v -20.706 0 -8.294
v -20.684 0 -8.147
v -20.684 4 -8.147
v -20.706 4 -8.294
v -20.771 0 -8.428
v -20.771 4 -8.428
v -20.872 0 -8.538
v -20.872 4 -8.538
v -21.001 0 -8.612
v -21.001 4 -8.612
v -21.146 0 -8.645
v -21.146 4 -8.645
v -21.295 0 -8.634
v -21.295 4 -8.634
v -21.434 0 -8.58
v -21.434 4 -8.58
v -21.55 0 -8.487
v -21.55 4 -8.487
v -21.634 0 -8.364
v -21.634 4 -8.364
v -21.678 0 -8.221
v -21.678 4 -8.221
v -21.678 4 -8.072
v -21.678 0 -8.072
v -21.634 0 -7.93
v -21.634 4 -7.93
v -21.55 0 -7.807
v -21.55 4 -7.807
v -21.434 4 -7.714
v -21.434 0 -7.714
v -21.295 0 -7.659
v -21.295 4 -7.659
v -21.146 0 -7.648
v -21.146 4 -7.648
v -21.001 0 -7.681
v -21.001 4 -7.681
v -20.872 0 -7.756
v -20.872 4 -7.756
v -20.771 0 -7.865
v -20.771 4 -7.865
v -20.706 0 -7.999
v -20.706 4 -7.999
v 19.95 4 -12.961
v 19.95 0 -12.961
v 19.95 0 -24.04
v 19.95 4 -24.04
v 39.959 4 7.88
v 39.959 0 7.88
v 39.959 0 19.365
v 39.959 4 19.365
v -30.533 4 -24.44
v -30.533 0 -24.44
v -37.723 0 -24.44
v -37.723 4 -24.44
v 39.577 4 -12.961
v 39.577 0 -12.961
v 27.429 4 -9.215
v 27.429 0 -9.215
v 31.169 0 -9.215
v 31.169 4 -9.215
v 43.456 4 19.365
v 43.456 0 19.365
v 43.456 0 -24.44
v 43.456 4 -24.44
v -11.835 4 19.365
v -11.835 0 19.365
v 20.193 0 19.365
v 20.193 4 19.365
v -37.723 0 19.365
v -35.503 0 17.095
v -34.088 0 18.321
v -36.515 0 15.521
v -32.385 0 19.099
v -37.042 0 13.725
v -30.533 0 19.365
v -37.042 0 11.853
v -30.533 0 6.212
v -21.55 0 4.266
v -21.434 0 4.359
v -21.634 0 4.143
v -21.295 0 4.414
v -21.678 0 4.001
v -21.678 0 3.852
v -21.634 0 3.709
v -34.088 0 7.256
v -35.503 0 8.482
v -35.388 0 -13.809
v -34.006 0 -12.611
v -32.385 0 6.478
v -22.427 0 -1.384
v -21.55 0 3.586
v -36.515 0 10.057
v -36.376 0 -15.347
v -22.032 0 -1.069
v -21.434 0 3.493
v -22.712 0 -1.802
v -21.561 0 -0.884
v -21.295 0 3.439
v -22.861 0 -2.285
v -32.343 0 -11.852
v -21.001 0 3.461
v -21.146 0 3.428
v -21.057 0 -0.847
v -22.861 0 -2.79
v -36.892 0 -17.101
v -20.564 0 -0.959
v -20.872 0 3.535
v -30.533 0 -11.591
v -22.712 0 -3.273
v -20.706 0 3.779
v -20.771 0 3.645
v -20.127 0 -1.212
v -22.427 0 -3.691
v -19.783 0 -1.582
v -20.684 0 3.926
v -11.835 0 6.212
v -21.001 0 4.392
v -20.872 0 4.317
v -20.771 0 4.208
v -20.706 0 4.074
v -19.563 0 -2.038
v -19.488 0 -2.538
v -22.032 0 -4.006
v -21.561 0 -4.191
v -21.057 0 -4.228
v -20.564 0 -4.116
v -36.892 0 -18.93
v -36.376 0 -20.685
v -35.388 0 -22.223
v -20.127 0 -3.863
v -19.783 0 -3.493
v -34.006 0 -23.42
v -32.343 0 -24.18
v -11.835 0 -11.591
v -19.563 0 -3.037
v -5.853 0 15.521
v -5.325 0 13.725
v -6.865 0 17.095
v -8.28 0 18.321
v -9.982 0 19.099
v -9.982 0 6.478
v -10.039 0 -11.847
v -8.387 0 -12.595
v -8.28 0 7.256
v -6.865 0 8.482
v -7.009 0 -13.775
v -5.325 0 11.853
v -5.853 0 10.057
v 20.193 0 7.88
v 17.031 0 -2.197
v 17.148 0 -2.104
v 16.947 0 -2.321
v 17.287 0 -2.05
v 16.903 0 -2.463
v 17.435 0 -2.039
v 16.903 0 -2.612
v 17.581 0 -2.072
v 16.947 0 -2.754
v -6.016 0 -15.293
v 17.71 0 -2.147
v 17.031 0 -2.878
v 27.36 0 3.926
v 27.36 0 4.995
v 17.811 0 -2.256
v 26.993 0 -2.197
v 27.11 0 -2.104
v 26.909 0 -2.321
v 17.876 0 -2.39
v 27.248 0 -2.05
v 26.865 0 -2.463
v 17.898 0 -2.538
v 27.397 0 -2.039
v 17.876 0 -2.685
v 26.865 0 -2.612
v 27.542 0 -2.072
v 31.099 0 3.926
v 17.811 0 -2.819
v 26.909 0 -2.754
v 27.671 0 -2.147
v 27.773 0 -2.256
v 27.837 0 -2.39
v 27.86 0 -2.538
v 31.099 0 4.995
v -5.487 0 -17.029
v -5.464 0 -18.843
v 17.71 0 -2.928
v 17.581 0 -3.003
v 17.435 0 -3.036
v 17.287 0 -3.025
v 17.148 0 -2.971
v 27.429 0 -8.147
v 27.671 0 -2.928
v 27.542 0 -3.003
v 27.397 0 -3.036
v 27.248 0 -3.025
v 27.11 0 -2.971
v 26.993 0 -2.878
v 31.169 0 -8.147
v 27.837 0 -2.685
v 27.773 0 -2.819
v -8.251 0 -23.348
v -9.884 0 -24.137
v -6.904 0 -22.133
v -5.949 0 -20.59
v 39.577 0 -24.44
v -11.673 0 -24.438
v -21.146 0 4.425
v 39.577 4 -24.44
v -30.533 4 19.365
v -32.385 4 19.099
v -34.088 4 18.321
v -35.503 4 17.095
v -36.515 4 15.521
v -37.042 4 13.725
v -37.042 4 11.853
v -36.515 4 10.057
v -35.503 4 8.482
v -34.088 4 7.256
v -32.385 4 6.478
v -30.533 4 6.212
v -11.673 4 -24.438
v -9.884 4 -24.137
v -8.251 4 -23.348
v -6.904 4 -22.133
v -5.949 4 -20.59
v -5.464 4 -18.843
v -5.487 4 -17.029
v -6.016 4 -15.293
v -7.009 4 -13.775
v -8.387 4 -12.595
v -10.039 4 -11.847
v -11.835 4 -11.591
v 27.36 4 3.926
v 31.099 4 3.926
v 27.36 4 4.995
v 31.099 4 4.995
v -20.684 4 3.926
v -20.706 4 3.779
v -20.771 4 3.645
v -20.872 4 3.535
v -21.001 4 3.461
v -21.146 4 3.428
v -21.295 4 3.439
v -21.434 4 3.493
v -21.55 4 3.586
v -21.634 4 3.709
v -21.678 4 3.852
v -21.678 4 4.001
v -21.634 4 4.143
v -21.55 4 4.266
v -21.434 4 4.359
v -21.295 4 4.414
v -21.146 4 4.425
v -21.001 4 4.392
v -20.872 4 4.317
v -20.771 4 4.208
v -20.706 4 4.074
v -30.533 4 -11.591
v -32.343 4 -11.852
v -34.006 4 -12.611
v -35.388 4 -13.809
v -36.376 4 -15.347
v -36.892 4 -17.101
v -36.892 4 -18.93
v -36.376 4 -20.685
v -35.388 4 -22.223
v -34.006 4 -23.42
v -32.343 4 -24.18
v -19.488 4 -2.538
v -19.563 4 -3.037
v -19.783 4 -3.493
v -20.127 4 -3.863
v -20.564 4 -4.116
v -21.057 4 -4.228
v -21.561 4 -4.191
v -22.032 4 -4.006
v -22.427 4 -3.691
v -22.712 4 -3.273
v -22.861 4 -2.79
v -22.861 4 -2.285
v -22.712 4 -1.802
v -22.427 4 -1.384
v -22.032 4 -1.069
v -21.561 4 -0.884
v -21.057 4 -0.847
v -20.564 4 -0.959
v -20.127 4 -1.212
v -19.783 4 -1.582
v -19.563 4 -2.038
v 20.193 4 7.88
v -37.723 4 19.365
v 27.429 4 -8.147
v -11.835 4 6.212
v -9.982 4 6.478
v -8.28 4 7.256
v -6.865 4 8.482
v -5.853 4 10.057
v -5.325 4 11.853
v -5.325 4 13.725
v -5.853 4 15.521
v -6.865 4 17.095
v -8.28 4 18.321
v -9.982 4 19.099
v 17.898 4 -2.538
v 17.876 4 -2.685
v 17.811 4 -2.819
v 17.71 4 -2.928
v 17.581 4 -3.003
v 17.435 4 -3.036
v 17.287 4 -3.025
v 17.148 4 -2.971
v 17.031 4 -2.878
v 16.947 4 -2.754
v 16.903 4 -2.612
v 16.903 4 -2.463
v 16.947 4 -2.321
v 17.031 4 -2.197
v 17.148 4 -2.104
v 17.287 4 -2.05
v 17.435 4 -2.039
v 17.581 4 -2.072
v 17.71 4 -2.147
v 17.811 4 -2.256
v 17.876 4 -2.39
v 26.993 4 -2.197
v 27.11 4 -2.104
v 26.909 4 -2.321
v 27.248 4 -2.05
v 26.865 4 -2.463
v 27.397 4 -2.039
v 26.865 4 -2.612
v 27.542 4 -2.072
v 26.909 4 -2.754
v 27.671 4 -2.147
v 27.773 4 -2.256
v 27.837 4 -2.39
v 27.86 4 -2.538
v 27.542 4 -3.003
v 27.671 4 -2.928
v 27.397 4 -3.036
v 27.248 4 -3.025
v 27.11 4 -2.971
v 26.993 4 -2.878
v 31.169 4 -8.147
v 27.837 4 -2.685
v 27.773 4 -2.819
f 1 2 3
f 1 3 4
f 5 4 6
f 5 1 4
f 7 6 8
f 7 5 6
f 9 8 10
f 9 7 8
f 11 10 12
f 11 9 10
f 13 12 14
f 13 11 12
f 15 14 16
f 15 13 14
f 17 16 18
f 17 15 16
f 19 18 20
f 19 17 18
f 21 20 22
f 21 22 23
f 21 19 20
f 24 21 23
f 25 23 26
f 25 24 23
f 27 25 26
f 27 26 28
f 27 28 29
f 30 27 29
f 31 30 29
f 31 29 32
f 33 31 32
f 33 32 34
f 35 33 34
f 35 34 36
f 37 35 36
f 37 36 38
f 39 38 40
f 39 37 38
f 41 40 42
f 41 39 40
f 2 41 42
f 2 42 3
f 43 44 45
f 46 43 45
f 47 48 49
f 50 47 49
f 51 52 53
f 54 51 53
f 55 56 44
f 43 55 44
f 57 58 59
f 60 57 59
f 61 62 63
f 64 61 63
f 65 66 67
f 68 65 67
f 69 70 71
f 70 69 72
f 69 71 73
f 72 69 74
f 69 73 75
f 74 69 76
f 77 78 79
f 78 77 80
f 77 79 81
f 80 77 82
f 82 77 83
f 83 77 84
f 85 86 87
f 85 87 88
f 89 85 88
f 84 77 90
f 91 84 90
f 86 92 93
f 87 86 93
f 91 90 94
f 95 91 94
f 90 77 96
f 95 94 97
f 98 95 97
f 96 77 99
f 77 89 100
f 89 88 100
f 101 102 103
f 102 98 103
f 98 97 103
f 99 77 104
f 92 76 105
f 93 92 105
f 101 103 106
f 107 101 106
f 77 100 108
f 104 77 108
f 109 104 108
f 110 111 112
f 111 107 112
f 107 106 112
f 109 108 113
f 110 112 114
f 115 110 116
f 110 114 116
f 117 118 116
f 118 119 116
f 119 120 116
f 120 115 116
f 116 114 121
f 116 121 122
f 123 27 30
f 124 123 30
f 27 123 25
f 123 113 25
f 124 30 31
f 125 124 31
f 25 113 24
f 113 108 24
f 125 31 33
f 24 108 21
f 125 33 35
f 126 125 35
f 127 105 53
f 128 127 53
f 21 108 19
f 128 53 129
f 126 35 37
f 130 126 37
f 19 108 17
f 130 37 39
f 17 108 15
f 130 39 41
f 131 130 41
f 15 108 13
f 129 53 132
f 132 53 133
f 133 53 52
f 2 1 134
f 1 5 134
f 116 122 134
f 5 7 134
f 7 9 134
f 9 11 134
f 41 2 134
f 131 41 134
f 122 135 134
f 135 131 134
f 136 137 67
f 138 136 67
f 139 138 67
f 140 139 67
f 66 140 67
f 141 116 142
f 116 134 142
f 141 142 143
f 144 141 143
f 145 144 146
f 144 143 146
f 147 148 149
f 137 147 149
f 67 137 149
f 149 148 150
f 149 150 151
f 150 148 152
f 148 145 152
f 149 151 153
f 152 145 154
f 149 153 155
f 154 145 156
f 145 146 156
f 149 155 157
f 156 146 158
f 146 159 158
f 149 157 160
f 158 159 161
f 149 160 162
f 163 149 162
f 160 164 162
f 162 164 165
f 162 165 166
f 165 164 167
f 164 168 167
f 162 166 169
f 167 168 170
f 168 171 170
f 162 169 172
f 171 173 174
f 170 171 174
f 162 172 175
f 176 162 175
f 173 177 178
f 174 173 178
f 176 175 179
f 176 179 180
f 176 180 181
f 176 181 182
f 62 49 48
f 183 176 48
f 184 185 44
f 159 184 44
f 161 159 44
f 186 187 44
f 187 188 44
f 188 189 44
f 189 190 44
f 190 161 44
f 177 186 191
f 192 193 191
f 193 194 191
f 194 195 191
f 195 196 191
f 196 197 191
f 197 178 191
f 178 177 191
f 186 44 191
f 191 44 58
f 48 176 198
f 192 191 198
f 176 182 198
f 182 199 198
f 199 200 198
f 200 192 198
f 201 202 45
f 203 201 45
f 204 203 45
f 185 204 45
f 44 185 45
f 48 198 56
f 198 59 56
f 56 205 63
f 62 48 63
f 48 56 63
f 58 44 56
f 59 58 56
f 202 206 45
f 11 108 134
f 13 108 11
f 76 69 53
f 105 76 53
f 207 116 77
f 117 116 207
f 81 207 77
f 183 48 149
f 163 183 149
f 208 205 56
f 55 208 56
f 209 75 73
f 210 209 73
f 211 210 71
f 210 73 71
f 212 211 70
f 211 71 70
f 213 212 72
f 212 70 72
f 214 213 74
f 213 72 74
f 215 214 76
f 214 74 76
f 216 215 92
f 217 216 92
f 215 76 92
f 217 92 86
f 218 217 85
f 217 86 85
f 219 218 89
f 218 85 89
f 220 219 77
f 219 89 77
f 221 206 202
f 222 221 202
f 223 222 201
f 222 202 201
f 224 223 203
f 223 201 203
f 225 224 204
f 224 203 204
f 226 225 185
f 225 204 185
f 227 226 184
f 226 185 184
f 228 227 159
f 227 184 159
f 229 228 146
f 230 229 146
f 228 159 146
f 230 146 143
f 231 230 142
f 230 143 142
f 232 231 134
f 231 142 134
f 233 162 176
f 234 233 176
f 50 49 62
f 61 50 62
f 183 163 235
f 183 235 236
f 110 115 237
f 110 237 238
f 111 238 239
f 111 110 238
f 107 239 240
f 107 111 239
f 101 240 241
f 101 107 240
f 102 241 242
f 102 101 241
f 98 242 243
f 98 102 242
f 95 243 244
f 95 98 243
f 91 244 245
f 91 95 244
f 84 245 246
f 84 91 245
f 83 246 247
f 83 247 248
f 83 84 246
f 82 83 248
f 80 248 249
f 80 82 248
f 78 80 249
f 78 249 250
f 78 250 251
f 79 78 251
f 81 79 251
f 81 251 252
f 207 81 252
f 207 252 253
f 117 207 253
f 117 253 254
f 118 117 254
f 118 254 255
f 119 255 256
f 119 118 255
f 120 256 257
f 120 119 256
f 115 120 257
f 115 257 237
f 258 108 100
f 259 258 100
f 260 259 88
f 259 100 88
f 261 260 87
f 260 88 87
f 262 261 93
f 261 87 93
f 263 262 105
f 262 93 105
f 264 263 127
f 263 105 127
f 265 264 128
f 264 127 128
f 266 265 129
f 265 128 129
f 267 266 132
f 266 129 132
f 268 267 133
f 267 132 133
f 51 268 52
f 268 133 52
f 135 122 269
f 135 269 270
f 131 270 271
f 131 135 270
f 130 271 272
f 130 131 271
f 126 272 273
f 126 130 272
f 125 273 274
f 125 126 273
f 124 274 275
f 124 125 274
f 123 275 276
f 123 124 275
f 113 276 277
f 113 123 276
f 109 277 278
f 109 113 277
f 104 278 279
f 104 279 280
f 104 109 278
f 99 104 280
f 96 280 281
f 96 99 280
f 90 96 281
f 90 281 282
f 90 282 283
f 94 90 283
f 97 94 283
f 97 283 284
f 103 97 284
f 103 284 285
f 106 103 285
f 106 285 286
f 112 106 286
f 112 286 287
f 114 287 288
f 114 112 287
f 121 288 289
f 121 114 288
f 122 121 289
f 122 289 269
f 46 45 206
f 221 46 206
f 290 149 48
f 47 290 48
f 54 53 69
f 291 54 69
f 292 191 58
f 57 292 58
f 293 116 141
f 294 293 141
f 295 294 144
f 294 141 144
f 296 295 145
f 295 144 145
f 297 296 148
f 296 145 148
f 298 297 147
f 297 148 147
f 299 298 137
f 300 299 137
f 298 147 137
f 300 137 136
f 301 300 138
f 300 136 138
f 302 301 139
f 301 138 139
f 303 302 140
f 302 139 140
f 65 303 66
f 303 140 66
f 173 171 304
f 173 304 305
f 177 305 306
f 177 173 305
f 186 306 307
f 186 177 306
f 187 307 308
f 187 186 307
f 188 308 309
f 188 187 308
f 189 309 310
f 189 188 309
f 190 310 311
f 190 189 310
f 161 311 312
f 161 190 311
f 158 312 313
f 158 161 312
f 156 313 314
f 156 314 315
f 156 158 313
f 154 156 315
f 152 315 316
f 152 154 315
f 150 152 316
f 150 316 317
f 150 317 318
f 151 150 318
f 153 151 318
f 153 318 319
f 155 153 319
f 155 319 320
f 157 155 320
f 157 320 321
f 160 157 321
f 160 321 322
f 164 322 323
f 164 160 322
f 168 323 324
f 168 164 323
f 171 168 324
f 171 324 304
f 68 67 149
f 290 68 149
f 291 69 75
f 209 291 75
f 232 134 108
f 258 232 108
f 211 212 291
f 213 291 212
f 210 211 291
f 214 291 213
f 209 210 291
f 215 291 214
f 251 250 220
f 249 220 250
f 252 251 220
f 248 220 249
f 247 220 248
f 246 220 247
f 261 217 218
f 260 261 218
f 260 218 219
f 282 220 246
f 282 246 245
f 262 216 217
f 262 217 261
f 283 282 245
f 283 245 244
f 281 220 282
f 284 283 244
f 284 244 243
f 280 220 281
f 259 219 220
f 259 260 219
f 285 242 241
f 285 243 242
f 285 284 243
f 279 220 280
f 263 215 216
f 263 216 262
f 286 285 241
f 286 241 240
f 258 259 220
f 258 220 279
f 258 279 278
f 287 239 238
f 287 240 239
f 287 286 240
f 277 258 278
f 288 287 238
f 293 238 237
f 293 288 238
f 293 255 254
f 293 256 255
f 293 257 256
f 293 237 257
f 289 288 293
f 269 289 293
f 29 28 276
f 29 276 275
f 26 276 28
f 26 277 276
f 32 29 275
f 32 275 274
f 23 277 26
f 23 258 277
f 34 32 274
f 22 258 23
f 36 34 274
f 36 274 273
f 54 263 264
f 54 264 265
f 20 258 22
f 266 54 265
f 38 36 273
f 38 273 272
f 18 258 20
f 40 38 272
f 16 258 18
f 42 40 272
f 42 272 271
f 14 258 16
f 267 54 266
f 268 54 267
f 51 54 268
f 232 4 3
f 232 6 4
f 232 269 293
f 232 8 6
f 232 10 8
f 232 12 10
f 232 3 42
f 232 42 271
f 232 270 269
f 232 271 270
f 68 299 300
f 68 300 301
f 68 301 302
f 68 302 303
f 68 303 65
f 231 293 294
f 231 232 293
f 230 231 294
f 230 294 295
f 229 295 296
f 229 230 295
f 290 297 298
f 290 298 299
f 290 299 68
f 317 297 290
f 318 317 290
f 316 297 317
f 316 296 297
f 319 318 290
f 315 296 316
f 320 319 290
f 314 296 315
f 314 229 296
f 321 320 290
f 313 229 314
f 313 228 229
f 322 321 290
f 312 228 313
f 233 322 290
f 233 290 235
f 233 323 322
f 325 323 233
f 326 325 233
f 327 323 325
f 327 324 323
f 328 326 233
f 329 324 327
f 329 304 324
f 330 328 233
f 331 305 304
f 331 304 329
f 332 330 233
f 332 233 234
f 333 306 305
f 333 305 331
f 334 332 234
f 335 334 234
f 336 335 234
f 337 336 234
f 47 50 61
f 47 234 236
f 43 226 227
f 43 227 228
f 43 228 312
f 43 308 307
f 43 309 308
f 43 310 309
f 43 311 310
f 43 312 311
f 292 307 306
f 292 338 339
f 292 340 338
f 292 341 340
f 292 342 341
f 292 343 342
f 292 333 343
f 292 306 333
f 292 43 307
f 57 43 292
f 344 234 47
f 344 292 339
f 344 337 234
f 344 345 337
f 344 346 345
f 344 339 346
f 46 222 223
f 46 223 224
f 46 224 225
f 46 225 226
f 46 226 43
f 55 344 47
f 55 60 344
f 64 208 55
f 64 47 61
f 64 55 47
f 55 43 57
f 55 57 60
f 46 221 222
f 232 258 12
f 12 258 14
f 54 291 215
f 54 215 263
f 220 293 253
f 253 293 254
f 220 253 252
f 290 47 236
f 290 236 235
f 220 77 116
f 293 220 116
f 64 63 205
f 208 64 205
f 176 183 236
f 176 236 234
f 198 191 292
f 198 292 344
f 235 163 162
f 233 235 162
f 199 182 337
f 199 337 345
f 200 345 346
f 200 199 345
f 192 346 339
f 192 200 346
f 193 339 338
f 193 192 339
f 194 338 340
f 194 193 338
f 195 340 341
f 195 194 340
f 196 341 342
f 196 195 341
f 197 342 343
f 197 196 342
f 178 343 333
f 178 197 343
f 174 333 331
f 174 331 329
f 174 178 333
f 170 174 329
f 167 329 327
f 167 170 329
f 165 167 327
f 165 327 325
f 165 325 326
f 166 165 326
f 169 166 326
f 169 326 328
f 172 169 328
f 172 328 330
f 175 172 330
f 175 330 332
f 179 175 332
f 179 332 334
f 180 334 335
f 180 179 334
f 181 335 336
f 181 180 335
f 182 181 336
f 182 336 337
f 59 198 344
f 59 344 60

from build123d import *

# Parameters (mm, degrees)
SKETCH1_R           = 0.5
SKETCH1_R_2         = 1.695720035
SKETCH1_W           = 3.739481929
SKETCH1_H           = 1.068423409
SKETCH1_W_2         = 3.73948193
BOSS_EXTRUDE1_DEPTH = 4


with BuildPart() as part:
    # Sketch1 → Boss-Extrude1 (new body)
    with BuildSketch(Plane(origin=(0, 0, 0), x_dir=(1, 0, 0), z_dir=(0, 1, 0))):
        with BuildLine():
            Line((43.455785529, -19.365174275), (43.455785529, 24.440185465))
            Line((43.455785529, 24.440185465), (39.576612996, 24.440185465))
            Line((39.576612996, 24.440185465), (39.576612996, 12.960768953))
            Line((39.576612996, 12.960768953), (19.950470546, 12.960768953))
            Line((19.950470546, 12.960768953), (19.950470546, 24.039526687))
            Line((19.950470546, 24.039526687), (-11.673190701, 24.438144265))
            ThreePointArc((-11.673190701, 24.438144265), (-5.411187986, 17.934763274), (-11.83512585, 11.591289096))
            Line((-11.83512585, 11.591289096), (-30.532535496, 11.591289096))
            ThreePointArc((-30.532535496, 11.591289096), (-36.95698368, 18.01573728), (-30.532535496, 24.440185465))
            Line((-30.532535496, 24.440185465), (-37.72291673, 24.440185465))
            Line((-37.72291673, 24.440185465), (-37.72291673, -19.365174275))
            Line((-37.72291673, -19.365174275), (-30.532535496, -19.365174275))
            ThreePointArc((-30.532535496, -19.365174275), (-37.109148108, -12.788561662), (-30.532535496, -6.21194905))
            Line((-30.532535496, -6.21194905), (-11.83512585, -6.21194905))
            ThreePointArc((-11.83512585, -6.21194905), (-5.258513237, -12.788561662), (-11.83512585, -19.365174275))
            Line((-11.83512585, -19.365174275), (20.193370142, -19.365174275))
            Line((20.193370142, -19.365174275), (20.193370142, -7.879622636))
            Line((20.193370142, -7.879622636), (39.959203195, -7.879622636))
            Line((39.959203195, -7.879622636), (39.959203195, -19.365174275))
            Line((39.959203195, -19.365174275), (43.455785529, -19.365174275))
        make_face()
        with Locations((-21.183830673, -3.926210212)):
            Circle(SKETCH1_R, mode=Mode.SUBTRACT)
        with Locations((-21.183830673, 2.537505595)):
            Circle(SKETCH1_R_2, mode=Mode.SUBTRACT)
        with Locations((17.397892673, 2.537505595)):
            Circle(SKETCH1_R, mode=Mode.SUBTRACT)
        with Locations((29.229431853, -4.460421917)):
            Rectangle(SKETCH1_W, SKETCH1_H, mode=Mode.SUBTRACT)
        with Locations((27.359690888, 2.537505595)):
            Circle(SKETCH1_R, mode=Mode.SUBTRACT)
        with Locations((-21.183830673, 8.146728488)):
            Circle(SKETCH1_R, mode=Mode.SUBTRACT)
        with Locations((29.299175369, 8.680940192)):
            Rectangle(SKETCH1_W_2, SKETCH1_H, mode=Mode.SUBTRACT)
    extrude(amount=BOSS_EXTRUDE1_DEPTH)


solid = part.part
